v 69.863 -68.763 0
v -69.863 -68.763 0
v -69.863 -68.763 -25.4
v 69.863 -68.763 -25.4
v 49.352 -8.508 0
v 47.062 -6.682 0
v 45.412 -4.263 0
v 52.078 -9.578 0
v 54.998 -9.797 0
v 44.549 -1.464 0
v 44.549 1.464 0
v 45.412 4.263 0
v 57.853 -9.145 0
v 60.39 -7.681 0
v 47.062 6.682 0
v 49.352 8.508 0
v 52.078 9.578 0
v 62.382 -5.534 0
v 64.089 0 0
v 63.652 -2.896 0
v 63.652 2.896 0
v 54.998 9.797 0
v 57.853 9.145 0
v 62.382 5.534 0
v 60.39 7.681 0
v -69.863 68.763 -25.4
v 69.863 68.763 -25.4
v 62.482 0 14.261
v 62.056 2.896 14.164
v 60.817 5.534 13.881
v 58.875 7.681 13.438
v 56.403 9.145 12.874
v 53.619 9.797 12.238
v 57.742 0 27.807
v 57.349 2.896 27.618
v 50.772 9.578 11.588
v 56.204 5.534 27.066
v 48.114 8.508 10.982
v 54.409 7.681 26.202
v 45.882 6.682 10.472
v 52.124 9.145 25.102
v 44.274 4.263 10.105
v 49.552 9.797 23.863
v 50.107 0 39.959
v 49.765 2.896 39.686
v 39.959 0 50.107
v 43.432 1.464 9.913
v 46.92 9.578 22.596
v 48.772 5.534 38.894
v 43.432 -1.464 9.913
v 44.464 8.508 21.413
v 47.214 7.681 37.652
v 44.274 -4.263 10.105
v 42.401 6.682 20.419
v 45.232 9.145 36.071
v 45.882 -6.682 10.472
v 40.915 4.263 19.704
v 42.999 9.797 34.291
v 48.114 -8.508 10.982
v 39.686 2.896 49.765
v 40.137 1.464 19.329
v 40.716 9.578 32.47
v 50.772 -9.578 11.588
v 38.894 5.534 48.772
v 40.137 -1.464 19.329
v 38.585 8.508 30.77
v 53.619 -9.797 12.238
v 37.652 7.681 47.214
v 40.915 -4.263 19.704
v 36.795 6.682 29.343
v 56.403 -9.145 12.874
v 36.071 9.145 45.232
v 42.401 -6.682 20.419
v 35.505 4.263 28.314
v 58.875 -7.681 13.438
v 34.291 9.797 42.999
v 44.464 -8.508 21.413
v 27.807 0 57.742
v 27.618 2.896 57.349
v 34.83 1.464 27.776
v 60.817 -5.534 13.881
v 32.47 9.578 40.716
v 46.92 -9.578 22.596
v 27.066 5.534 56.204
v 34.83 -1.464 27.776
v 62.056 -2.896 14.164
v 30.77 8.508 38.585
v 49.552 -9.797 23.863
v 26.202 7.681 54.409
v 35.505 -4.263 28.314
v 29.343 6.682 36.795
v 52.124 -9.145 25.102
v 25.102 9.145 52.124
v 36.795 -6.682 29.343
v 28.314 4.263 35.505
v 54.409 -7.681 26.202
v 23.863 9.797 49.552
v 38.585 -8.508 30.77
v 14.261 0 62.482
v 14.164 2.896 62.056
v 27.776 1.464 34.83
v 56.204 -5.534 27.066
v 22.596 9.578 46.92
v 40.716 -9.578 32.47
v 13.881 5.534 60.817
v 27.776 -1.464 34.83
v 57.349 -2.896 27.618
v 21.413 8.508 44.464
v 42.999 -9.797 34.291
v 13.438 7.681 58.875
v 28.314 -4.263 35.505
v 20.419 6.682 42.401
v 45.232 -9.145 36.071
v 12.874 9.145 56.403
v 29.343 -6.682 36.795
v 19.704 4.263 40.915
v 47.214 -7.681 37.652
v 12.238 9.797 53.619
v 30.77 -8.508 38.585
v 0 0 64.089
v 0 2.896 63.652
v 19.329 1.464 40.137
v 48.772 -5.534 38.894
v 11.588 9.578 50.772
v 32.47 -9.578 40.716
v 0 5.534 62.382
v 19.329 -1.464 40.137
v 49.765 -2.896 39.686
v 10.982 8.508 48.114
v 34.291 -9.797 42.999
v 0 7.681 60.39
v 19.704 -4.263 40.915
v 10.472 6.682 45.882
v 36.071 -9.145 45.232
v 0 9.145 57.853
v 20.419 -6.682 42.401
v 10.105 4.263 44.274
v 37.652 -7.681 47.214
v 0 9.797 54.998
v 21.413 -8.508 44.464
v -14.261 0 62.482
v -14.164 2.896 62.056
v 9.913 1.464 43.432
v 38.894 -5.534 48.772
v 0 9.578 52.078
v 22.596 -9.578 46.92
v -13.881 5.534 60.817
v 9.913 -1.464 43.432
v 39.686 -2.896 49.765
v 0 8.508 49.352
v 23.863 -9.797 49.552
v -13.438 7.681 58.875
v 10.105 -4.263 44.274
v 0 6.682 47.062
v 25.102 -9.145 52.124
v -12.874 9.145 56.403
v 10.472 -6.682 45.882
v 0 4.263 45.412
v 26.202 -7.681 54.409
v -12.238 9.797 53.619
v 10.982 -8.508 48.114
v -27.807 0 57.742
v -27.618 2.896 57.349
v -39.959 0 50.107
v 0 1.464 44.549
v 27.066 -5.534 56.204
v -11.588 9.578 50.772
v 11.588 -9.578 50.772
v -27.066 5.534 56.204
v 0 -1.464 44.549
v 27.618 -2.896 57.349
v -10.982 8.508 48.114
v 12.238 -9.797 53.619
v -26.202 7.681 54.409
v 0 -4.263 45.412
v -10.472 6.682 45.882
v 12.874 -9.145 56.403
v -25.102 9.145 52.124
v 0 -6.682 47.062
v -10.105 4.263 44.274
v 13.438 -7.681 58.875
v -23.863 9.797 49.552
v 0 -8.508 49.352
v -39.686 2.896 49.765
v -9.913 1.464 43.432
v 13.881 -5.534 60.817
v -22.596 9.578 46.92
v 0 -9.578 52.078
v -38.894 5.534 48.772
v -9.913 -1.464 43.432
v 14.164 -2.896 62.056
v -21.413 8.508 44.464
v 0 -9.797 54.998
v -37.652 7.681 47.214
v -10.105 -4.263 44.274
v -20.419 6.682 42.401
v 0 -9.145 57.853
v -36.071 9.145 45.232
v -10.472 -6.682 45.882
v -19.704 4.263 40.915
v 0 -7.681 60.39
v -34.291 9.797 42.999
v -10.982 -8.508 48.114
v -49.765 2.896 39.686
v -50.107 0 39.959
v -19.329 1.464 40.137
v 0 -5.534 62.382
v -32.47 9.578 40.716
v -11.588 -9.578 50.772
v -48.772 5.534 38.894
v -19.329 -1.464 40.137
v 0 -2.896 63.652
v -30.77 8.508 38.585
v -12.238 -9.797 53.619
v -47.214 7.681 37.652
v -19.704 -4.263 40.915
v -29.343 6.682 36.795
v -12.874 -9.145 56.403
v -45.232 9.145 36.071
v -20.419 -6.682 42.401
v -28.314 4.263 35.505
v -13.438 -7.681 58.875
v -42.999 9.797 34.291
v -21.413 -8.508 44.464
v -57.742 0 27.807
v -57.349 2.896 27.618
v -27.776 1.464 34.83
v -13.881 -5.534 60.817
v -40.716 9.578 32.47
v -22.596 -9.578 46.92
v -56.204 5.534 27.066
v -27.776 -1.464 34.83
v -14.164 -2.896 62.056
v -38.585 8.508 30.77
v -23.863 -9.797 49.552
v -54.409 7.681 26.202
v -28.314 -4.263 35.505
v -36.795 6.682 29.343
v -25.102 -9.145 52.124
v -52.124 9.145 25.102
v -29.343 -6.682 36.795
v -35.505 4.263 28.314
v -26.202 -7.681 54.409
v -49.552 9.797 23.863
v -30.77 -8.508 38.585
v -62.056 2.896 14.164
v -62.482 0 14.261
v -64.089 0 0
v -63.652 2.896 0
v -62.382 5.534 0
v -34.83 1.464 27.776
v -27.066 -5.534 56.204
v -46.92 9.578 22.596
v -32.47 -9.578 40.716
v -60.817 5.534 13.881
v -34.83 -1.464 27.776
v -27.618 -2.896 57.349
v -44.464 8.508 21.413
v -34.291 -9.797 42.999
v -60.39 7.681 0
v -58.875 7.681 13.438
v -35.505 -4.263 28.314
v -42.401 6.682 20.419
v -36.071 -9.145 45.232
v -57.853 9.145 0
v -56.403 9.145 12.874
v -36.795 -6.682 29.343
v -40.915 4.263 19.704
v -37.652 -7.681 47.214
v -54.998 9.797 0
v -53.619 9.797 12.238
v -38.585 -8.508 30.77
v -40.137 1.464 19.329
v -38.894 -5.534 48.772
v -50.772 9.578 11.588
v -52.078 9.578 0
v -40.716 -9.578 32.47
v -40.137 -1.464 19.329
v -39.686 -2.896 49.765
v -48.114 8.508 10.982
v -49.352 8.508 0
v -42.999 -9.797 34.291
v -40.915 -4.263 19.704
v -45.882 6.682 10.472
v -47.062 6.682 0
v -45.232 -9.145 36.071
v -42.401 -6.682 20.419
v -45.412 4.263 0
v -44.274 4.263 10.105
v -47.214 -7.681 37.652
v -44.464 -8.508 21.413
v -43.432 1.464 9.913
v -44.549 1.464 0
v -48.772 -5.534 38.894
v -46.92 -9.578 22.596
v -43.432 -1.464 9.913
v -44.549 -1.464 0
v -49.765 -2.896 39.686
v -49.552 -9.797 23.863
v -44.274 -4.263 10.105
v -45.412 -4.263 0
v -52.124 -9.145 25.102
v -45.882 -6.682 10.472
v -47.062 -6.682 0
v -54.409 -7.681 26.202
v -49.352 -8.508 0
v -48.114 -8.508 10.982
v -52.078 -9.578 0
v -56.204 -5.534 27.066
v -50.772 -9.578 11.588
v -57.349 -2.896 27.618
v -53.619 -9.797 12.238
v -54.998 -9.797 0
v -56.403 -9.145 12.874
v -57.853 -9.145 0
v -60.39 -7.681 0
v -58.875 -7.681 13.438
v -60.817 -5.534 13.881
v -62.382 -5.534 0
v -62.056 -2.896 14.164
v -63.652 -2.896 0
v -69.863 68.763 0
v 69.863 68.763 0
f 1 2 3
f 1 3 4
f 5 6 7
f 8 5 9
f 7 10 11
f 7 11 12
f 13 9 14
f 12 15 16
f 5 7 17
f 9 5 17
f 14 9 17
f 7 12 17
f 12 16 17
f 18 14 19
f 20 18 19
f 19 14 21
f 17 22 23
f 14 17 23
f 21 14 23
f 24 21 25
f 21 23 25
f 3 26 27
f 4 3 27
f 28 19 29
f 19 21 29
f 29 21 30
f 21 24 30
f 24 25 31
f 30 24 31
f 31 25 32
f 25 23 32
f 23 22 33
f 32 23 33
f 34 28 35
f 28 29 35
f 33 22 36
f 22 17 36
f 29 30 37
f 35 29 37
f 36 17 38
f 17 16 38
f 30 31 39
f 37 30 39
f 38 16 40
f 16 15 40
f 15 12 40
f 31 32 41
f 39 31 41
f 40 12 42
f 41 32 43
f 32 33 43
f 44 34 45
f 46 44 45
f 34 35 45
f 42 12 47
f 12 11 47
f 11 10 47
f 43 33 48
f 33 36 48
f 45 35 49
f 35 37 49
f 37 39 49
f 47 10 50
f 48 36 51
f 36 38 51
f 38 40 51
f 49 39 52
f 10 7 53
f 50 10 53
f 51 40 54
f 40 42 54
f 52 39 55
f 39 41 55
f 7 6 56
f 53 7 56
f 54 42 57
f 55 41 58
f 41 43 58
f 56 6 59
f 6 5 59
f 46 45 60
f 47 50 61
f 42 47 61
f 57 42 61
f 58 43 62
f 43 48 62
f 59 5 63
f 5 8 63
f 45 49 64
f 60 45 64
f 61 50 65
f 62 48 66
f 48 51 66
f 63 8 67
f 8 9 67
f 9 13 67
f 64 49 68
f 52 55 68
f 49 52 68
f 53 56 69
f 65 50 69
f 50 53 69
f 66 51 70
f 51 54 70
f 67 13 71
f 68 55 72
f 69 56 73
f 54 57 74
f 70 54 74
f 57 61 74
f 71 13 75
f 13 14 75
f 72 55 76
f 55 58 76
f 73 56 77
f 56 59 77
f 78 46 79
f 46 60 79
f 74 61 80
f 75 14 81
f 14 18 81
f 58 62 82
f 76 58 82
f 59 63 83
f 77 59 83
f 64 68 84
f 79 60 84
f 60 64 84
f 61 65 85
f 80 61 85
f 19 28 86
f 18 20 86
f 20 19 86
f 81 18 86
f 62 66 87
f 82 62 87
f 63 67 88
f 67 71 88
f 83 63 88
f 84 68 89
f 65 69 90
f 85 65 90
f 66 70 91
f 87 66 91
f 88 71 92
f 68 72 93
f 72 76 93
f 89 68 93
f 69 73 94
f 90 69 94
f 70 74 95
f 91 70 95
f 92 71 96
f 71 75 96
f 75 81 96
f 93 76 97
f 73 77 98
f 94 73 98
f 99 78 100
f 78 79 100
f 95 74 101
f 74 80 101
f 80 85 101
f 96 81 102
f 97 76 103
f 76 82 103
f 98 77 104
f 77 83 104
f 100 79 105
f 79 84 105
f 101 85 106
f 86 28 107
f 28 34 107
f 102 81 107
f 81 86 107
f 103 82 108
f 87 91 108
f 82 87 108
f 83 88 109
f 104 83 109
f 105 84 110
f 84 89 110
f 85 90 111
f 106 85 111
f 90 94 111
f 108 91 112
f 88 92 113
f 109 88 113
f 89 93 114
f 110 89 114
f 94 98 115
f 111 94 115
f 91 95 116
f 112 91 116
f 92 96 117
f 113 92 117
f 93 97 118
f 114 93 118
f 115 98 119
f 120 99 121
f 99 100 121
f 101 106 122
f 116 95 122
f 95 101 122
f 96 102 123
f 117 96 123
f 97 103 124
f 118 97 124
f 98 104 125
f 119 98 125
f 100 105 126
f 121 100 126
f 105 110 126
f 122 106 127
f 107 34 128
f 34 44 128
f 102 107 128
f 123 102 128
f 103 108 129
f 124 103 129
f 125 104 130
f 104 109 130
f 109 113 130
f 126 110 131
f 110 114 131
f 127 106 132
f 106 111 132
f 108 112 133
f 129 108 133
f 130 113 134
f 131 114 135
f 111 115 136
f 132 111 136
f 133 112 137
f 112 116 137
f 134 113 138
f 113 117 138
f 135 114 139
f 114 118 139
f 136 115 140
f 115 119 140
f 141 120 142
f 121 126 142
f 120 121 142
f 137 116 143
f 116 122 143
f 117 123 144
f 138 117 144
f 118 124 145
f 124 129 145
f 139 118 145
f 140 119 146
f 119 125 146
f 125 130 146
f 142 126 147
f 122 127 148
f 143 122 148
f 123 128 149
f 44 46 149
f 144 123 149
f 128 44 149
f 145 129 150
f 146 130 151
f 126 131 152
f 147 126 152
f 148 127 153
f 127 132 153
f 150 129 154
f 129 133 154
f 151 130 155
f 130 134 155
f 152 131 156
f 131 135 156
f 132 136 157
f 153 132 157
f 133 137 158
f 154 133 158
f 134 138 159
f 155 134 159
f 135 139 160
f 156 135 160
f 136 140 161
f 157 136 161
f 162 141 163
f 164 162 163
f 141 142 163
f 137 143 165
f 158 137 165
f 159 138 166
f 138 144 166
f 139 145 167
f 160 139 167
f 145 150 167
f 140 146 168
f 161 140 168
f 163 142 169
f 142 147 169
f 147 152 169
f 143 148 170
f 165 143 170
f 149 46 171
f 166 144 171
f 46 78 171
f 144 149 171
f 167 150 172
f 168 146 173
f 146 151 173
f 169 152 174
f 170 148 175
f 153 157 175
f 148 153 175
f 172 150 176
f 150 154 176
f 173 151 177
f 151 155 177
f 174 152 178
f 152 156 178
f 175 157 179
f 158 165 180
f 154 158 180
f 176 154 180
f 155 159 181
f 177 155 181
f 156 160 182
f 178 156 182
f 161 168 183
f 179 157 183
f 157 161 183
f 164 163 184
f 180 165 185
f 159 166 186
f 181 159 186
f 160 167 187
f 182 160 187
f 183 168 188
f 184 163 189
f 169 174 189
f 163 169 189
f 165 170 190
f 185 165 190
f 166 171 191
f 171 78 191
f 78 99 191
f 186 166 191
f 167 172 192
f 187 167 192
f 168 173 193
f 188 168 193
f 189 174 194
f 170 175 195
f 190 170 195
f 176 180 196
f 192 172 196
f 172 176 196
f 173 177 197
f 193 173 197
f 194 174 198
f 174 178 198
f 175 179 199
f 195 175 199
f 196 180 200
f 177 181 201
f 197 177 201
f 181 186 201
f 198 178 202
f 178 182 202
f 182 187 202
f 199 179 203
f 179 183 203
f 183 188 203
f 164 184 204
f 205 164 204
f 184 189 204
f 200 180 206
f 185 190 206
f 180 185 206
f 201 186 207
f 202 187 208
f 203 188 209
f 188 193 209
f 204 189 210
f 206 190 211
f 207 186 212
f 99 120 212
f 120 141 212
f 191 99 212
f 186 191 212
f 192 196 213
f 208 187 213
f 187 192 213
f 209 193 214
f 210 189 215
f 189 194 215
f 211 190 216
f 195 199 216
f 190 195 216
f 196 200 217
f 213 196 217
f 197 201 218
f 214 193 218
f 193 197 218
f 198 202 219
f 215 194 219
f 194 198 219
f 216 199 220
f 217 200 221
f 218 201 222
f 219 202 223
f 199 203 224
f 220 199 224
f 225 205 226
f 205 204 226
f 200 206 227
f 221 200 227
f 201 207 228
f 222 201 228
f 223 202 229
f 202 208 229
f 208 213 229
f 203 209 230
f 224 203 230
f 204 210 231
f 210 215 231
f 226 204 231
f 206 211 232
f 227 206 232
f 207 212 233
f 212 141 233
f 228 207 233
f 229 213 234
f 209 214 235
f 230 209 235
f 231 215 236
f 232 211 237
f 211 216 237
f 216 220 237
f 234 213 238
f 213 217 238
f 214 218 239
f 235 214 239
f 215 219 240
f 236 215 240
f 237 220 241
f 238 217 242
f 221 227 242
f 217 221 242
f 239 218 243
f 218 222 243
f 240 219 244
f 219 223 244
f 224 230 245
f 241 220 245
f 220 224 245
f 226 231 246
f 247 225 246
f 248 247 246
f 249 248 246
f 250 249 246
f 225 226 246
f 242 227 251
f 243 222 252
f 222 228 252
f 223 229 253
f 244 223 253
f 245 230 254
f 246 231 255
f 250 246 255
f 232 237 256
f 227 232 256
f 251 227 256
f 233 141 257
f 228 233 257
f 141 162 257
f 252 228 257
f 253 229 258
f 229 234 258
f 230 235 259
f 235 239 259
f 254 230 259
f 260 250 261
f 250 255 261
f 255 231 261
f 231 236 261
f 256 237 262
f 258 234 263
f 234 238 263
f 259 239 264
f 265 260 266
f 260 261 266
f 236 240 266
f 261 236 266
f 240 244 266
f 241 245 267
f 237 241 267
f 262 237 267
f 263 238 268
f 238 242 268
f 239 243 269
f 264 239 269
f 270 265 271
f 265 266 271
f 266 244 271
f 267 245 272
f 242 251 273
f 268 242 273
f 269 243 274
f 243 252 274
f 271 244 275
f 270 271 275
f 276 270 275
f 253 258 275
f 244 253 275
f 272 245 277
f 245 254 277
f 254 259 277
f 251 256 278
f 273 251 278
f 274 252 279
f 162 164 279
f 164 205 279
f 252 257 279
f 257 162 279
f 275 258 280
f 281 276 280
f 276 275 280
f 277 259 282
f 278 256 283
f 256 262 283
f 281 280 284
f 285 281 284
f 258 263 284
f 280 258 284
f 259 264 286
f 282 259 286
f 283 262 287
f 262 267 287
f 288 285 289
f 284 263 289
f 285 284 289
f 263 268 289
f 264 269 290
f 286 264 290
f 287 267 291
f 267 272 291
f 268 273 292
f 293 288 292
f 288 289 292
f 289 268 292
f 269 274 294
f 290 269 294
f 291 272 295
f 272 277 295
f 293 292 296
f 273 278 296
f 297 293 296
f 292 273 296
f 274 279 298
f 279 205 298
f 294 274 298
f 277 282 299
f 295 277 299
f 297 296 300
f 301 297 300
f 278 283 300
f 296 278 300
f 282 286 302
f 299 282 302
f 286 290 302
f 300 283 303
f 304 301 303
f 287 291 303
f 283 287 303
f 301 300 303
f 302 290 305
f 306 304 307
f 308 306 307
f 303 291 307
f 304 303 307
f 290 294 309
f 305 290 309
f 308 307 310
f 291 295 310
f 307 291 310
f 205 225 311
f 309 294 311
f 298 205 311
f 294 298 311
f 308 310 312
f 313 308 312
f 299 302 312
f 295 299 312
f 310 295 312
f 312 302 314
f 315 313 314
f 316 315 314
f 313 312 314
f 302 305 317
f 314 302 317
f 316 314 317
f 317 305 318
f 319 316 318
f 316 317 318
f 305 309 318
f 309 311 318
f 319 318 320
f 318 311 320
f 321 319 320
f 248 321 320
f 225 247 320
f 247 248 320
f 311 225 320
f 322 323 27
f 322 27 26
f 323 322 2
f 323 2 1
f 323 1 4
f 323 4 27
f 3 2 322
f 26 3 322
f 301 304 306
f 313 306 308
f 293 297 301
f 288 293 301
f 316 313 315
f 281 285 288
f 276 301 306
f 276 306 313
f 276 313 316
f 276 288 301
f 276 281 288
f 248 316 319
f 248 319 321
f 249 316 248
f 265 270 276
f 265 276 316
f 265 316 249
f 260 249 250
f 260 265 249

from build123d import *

# Parameters (mm, degrees)
F0_W     = 69.863096
F0_H     = 137.526572
F2_DEPTH = 25.4
F1_R     = 9.824635
F3_ANGLE = 180


with BuildPart() as f2:
    # F0 (on Top) → F2 (new body)
    with BuildSketch(Plane.XY):
        with Locations((34.931548, 0)):
            Rectangle(F0_W, F0_H)
        with Locations((-34.931548, 0)):
            Rectangle(F0_W, F0_H)
    extrude(amount=-F2_DEPTH)


with BuildPart() as f3:
    # F1 (on Top) → F3 (revolve)
    with BuildSketch(Plane.XY):
        with Locations((54.264009, 0)):
            Circle(F1_R)
    revolve(axis=Axis((0, 0, 0), (0, -1, 0)), revolution_arc=F3_ANGLE)


solid = Compound([f2.part, f3.part])
